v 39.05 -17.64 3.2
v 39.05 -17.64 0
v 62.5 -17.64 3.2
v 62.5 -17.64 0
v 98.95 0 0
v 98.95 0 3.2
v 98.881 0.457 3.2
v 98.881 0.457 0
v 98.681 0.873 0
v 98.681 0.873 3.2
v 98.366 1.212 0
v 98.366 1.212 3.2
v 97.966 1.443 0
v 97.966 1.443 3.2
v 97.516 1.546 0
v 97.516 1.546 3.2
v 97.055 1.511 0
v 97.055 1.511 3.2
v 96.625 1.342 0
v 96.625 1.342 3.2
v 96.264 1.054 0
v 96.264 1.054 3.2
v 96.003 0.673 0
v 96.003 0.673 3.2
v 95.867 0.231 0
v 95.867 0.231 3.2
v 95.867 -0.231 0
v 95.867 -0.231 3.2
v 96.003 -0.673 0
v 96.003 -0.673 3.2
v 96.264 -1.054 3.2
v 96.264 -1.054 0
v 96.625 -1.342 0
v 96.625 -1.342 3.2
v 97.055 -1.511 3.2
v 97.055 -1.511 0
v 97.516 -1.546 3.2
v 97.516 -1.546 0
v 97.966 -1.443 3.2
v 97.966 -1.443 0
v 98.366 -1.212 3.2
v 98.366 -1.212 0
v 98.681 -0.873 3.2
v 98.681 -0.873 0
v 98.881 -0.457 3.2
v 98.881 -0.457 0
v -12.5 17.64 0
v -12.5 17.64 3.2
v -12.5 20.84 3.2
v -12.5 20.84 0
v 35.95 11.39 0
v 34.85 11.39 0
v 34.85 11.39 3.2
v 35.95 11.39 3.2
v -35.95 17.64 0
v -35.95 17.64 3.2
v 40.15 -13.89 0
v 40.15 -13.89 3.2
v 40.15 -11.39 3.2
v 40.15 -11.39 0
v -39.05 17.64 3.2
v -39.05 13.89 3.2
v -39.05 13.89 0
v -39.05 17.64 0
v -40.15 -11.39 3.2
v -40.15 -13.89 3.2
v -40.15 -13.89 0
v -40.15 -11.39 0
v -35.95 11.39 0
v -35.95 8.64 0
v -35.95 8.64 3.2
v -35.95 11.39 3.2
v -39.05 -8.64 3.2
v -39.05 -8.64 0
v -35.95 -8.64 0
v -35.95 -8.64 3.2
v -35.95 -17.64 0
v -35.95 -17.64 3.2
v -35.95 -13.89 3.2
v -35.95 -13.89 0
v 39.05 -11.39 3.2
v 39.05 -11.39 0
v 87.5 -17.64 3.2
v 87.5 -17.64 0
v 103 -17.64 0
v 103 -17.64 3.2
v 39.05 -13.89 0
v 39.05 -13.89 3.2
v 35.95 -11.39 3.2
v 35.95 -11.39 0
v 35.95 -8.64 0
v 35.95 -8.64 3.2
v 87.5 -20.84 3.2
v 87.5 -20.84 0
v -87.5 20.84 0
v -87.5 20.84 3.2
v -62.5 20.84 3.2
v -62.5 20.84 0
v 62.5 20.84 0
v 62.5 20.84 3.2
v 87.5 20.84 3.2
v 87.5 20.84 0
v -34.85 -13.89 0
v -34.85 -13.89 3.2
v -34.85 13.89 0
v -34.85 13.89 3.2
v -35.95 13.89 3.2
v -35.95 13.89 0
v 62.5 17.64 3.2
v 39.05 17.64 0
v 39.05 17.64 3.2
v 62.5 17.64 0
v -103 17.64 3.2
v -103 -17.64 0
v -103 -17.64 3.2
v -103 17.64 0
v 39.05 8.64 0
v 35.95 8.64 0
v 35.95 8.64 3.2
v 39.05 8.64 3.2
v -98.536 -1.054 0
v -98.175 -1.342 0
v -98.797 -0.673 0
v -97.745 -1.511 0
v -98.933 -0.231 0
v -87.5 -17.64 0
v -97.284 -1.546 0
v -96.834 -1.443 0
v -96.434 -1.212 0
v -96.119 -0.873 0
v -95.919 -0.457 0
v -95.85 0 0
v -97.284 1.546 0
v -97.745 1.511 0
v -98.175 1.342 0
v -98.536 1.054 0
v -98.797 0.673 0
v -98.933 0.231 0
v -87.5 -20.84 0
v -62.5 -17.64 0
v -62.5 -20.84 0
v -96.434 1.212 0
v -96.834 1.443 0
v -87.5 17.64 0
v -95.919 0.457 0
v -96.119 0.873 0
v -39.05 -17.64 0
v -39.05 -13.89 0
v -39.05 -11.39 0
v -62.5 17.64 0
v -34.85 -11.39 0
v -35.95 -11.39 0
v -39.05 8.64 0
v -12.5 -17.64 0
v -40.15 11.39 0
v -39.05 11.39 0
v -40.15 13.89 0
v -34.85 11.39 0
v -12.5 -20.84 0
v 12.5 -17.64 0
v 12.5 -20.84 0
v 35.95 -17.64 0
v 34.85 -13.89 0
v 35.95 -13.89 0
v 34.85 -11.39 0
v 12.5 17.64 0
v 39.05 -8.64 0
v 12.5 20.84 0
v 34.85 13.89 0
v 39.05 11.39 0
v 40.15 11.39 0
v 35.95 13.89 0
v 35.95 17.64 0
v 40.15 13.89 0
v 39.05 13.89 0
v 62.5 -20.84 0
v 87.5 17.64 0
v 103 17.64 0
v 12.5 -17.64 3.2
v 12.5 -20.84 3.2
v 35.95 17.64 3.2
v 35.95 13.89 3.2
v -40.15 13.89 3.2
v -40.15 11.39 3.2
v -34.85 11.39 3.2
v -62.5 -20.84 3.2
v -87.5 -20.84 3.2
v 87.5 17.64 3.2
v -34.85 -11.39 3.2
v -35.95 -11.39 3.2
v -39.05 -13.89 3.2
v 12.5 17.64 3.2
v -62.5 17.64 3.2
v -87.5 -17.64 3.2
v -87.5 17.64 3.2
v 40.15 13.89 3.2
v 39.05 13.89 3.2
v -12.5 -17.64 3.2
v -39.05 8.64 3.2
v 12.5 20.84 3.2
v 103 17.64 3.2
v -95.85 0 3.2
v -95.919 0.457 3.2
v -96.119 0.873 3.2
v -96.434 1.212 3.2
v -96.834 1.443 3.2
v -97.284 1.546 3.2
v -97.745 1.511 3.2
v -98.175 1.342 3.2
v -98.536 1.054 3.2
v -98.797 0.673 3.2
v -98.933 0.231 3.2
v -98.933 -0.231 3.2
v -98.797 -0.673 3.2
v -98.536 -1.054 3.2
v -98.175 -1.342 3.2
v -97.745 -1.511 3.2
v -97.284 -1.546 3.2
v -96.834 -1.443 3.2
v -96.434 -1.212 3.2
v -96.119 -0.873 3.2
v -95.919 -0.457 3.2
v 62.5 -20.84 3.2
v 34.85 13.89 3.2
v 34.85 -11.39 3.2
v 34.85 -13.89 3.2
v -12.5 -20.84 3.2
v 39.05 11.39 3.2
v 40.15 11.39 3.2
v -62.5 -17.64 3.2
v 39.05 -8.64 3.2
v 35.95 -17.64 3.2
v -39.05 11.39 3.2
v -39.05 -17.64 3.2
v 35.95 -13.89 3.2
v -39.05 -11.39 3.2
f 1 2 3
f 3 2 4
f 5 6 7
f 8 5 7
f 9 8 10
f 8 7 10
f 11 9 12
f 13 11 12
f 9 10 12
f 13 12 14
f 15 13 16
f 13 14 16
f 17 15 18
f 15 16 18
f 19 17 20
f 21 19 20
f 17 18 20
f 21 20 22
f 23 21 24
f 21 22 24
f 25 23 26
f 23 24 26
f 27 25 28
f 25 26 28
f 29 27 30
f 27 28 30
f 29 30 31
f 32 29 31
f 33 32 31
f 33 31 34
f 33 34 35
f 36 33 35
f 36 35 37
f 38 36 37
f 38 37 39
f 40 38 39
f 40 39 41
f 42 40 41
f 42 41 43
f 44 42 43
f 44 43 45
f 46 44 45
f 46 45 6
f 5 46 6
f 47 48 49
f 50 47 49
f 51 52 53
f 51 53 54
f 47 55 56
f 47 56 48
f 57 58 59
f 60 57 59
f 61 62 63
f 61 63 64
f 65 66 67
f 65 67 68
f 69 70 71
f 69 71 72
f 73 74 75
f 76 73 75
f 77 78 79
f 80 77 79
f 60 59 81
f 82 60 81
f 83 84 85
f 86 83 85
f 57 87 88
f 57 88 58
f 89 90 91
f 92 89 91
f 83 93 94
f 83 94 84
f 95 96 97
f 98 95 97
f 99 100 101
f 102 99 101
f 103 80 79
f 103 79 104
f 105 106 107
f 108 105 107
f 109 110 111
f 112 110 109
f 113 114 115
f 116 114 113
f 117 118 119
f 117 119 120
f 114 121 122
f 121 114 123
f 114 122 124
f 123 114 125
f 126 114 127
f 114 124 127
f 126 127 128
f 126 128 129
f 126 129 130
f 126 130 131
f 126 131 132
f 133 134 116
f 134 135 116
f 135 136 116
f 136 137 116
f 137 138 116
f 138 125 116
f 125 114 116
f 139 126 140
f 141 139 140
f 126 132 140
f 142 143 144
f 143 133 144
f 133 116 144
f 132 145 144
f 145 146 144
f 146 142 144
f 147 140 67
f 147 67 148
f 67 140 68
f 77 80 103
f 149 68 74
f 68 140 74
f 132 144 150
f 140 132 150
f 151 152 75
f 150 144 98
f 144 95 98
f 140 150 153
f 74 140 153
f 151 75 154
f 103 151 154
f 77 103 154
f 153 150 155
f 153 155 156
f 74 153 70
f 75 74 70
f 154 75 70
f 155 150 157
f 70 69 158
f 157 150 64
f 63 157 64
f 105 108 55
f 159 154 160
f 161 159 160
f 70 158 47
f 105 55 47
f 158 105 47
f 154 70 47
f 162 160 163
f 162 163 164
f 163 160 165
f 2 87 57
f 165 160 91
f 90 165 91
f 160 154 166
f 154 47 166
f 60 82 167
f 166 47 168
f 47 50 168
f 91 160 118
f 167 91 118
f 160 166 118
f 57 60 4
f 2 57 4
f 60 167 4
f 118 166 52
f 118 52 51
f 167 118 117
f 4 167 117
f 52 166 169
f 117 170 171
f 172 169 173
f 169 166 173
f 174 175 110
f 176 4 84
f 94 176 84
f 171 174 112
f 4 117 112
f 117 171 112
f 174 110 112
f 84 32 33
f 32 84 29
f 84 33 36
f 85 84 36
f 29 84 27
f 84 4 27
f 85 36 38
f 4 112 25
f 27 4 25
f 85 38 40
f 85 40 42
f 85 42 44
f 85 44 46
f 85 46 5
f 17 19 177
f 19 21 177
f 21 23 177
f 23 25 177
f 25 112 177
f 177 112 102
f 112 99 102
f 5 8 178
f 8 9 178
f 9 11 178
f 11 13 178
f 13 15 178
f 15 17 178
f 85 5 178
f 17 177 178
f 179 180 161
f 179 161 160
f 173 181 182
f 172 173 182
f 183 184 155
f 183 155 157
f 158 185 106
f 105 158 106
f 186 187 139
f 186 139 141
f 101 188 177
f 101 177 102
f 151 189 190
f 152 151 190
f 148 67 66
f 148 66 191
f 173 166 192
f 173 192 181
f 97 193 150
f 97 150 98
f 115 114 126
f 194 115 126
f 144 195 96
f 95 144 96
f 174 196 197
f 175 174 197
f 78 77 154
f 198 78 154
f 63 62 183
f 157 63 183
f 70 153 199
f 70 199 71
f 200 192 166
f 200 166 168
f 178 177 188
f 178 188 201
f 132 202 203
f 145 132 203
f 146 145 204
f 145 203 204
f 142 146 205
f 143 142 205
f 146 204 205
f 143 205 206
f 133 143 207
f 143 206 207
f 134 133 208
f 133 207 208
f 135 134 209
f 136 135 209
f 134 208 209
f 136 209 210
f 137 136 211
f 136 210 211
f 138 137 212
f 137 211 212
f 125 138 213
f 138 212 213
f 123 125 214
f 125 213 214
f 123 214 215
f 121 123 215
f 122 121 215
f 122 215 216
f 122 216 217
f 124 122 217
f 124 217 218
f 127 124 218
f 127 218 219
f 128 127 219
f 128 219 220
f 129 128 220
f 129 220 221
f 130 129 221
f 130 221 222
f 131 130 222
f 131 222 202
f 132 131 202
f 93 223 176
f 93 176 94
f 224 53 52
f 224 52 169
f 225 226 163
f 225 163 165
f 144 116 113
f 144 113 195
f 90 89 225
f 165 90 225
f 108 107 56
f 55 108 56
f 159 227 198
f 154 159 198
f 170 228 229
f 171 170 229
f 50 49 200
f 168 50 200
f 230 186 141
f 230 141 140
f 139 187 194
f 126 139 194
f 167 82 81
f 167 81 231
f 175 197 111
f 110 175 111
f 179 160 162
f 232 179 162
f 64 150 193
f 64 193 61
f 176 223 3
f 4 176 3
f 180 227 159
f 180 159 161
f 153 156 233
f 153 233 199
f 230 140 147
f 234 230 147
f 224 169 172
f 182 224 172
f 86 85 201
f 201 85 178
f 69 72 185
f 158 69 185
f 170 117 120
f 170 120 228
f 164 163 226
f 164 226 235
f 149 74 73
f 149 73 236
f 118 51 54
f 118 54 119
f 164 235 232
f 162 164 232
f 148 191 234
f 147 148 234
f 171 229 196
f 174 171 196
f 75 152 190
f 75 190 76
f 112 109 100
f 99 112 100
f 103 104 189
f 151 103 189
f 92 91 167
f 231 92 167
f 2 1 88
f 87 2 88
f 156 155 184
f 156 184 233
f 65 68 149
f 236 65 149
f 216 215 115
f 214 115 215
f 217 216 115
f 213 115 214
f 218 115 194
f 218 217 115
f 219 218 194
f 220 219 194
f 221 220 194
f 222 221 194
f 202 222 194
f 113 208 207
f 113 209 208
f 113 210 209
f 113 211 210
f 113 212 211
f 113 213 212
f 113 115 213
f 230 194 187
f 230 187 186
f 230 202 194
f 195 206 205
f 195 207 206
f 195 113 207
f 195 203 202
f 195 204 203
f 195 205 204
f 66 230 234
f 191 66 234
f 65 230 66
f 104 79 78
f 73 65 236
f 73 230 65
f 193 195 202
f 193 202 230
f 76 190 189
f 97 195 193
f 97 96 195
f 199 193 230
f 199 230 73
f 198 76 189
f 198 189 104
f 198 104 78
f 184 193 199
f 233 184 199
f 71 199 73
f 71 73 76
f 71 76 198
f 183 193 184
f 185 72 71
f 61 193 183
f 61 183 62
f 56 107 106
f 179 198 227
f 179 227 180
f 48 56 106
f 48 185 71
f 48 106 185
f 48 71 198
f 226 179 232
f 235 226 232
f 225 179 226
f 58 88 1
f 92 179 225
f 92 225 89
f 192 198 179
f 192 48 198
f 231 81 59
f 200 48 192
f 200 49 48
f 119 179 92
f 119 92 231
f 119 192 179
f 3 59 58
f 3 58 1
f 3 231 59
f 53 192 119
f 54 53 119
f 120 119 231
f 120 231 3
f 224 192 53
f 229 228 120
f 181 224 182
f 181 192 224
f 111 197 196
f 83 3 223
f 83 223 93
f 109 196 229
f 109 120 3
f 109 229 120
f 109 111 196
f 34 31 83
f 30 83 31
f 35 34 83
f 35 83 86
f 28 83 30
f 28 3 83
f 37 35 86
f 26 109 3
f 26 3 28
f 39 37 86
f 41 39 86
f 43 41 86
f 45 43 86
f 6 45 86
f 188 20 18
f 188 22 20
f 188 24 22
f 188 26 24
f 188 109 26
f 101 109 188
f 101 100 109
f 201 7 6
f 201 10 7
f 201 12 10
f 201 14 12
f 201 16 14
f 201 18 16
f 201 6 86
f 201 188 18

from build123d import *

# Parameters (mm, degrees)
F1_W     = 206
F1_H     = 35.28
F2_DEPTH = 3.2
F3_W     = 25
F3_H     = 3.2
F4_DEPTH = 3.2
F5_R     = 1.55
F5_W     = 3.1
F5_H     = 3.75
F5_H_2   = 2.5
F5_W_2   = 1.1
F5_H_3   = 2.75
F6_DEPTH = 3.201


with BuildPart() as f2:
    # F1 (on Top) → F2 (new body)
    with BuildSketch(Plane.XY):
        Rectangle(F1_W, F1_H)
    extrude(amount=F2_DEPTH)

    # F3 (on face) → F4 (join, through all)
    with BuildSketch(Plane.XY.offset(3.2)):
        with Locations((-75, -19.24)):
            Rectangle(F3_W, F3_H)
        with Locations((0, -19.24)):
            Rectangle(F3_W, F3_H)
        with Locations((75, -19.24)):
            Rectangle(F3_W, F3_H)
        with Locations((75, 19.24)):
            Rectangle(F3_W, F3_H)
        with Locations((-75, 19.24)):
            Rectangle(F3_W, F3_H)
        with Locations((0, 19.24)):
            Rectangle(F3_W, F3_H)
    extrude(amount=-F4_DEPTH)

    # F5 (on face) → F6 (cut, through all)
    with BuildSketch(Plane.XY.offset(3.2)):
        with Locations((-97.4, 0)):
            Circle(F5_R)
        with Locations((97.4, 0)):
            Circle(F5_R)
        with Locations((-37.5, -15.765)):
            Rectangle(F5_W, F5_H)
        with Locations((-37.5, -12.64)):
            Rectangle(F5_W, F5_H_2)
        with Locations((-35.4, -12.64)):
            Rectangle(F5_W_2, F5_H_2)
        with Locations((-37.5, -10.015)):
            Rectangle(F5_W, F5_H_3)
        with Locations((-39.6, -12.64)):
            Rectangle(F5_W_2, F5_H_2)
        with Locations((37.5, -15.765)):
            Rectangle(F5_W, F5_H)
        with Locations((37.5, -12.64)):
            Rectangle(F5_W, F5_H_2)
        with Locations((35.4, -12.64)):
            Rectangle(F5_W_2, F5_H_2)
        with Locations((39.6, -12.64)):
            Rectangle(F5_W_2, F5_H_2)
        with Locations((37.5, -10.015)):
            Rectangle(F5_W, F5_H_3)
        with Locations((-37.5, 10.015)):
            Rectangle(F5_W, F5_H_3)
        with Locations((-35.4, 12.64)):
            Rectangle(F5_W_2, F5_H_2)
        with Locations((-37.5, 12.64)):
            Rectangle(F5_W, F5_H_2)
        with Locations((-39.6, 12.64)):
            Rectangle(F5_W_2, F5_H_2)
        with Locations((-37.5, 15.765)):
            Rectangle(F5_W, F5_H)
        with Locations((39.6, 12.64)):
            Rectangle(F5_W_2, F5_H_2)
        with Locations((37.5, 10.015)):
            Rectangle(F5_W, F5_H_3)
        with Locations((37.5, 12.64)):
            Rectangle(F5_W, F5_H_2)
        with Locations((37.5, 15.765)):
            Rectangle(F5_W, F5_H)
        with Locations((35.4, 12.64)):
            Rectangle(F5_W_2, F5_H_2)
    extrude(amount=-F6_DEPTH, mode=Mode.SUBTRACT)


solid = f2.part
